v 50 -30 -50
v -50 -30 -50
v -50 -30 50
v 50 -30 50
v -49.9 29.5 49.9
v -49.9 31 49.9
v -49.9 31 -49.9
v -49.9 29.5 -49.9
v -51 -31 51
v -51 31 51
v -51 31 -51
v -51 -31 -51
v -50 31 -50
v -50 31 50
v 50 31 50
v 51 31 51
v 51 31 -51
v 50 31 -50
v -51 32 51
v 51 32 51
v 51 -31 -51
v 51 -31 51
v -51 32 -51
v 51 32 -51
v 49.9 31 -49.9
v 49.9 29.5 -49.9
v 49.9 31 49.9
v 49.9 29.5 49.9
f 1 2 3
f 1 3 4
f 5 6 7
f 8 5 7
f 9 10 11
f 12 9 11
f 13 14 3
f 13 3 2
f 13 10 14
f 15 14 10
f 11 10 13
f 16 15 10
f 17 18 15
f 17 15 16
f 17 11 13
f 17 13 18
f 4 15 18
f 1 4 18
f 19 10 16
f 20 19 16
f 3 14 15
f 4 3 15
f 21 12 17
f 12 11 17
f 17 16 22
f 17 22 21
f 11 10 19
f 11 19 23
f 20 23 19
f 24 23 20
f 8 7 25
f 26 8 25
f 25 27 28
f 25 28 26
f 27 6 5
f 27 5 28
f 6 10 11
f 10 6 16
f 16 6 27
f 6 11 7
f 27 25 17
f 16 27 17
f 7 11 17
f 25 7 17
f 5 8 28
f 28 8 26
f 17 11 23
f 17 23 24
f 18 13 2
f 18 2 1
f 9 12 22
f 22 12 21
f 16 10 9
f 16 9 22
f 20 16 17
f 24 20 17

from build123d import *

# Parameters (mm, degrees)
SKETCH2_W           = 102
SKETCH2_H           = 102
BOSS_EXTRUDE1_DEPTH = 31
SHELL1_T            = -1
SKETCH3_W           = 99.8
SKETCH3_H           = 99.8
BOSS_EXTRUDE2_DEPTH = 1.5
SKETCH4_W           = 102
SKETCH4_H           = 102
BOSS_EXTRUDE3_DEPTH = 1


with BuildPart() as part:
    # Sketch2 → Boss-Extrude1 (new, symmetric)
    with BuildSketch(Plane(origin=(0, 0, 0), x_dir=(1, 0, 0), z_dir=(0, 1, 0))):
        Rectangle(SKETCH2_W, SKETCH2_H)
    extrude(amount=BOSS_EXTRUDE1_DEPTH, both=True)

    # Shell1
    shell1_openings = [part.faces().sort_by_distance(p)[0] for p in [
        (0, 31, 0),
    ]]
    offset(amount=SHELL1_T, openings=shell1_openings, kind=Kind.INTERSECTION)


with BuildPart() as body_2:
    # Sketch3 → Boss-Extrude2 (new body)
    with BuildSketch(Plane(origin=(0, 31, 0), x_dir=(1, 0, 0), z_dir=(0, 1, 0))):
        Rectangle(SKETCH3_W, SKETCH3_H)
    extrude(amount=-BOSS_EXTRUDE2_DEPTH)

    # Sketch4 → Boss-Extrude3 (add)
    with BuildSketch(Plane(origin=(0, 31, 0), x_dir=(1, 0, 0), z_dir=(0, 1, 0))):
        Rectangle(SKETCH4_W, SKETCH4_H)
    extrude(amount=BOSS_EXTRUDE3_DEPTH)


solid = Compound([part.part, body_2.part])
